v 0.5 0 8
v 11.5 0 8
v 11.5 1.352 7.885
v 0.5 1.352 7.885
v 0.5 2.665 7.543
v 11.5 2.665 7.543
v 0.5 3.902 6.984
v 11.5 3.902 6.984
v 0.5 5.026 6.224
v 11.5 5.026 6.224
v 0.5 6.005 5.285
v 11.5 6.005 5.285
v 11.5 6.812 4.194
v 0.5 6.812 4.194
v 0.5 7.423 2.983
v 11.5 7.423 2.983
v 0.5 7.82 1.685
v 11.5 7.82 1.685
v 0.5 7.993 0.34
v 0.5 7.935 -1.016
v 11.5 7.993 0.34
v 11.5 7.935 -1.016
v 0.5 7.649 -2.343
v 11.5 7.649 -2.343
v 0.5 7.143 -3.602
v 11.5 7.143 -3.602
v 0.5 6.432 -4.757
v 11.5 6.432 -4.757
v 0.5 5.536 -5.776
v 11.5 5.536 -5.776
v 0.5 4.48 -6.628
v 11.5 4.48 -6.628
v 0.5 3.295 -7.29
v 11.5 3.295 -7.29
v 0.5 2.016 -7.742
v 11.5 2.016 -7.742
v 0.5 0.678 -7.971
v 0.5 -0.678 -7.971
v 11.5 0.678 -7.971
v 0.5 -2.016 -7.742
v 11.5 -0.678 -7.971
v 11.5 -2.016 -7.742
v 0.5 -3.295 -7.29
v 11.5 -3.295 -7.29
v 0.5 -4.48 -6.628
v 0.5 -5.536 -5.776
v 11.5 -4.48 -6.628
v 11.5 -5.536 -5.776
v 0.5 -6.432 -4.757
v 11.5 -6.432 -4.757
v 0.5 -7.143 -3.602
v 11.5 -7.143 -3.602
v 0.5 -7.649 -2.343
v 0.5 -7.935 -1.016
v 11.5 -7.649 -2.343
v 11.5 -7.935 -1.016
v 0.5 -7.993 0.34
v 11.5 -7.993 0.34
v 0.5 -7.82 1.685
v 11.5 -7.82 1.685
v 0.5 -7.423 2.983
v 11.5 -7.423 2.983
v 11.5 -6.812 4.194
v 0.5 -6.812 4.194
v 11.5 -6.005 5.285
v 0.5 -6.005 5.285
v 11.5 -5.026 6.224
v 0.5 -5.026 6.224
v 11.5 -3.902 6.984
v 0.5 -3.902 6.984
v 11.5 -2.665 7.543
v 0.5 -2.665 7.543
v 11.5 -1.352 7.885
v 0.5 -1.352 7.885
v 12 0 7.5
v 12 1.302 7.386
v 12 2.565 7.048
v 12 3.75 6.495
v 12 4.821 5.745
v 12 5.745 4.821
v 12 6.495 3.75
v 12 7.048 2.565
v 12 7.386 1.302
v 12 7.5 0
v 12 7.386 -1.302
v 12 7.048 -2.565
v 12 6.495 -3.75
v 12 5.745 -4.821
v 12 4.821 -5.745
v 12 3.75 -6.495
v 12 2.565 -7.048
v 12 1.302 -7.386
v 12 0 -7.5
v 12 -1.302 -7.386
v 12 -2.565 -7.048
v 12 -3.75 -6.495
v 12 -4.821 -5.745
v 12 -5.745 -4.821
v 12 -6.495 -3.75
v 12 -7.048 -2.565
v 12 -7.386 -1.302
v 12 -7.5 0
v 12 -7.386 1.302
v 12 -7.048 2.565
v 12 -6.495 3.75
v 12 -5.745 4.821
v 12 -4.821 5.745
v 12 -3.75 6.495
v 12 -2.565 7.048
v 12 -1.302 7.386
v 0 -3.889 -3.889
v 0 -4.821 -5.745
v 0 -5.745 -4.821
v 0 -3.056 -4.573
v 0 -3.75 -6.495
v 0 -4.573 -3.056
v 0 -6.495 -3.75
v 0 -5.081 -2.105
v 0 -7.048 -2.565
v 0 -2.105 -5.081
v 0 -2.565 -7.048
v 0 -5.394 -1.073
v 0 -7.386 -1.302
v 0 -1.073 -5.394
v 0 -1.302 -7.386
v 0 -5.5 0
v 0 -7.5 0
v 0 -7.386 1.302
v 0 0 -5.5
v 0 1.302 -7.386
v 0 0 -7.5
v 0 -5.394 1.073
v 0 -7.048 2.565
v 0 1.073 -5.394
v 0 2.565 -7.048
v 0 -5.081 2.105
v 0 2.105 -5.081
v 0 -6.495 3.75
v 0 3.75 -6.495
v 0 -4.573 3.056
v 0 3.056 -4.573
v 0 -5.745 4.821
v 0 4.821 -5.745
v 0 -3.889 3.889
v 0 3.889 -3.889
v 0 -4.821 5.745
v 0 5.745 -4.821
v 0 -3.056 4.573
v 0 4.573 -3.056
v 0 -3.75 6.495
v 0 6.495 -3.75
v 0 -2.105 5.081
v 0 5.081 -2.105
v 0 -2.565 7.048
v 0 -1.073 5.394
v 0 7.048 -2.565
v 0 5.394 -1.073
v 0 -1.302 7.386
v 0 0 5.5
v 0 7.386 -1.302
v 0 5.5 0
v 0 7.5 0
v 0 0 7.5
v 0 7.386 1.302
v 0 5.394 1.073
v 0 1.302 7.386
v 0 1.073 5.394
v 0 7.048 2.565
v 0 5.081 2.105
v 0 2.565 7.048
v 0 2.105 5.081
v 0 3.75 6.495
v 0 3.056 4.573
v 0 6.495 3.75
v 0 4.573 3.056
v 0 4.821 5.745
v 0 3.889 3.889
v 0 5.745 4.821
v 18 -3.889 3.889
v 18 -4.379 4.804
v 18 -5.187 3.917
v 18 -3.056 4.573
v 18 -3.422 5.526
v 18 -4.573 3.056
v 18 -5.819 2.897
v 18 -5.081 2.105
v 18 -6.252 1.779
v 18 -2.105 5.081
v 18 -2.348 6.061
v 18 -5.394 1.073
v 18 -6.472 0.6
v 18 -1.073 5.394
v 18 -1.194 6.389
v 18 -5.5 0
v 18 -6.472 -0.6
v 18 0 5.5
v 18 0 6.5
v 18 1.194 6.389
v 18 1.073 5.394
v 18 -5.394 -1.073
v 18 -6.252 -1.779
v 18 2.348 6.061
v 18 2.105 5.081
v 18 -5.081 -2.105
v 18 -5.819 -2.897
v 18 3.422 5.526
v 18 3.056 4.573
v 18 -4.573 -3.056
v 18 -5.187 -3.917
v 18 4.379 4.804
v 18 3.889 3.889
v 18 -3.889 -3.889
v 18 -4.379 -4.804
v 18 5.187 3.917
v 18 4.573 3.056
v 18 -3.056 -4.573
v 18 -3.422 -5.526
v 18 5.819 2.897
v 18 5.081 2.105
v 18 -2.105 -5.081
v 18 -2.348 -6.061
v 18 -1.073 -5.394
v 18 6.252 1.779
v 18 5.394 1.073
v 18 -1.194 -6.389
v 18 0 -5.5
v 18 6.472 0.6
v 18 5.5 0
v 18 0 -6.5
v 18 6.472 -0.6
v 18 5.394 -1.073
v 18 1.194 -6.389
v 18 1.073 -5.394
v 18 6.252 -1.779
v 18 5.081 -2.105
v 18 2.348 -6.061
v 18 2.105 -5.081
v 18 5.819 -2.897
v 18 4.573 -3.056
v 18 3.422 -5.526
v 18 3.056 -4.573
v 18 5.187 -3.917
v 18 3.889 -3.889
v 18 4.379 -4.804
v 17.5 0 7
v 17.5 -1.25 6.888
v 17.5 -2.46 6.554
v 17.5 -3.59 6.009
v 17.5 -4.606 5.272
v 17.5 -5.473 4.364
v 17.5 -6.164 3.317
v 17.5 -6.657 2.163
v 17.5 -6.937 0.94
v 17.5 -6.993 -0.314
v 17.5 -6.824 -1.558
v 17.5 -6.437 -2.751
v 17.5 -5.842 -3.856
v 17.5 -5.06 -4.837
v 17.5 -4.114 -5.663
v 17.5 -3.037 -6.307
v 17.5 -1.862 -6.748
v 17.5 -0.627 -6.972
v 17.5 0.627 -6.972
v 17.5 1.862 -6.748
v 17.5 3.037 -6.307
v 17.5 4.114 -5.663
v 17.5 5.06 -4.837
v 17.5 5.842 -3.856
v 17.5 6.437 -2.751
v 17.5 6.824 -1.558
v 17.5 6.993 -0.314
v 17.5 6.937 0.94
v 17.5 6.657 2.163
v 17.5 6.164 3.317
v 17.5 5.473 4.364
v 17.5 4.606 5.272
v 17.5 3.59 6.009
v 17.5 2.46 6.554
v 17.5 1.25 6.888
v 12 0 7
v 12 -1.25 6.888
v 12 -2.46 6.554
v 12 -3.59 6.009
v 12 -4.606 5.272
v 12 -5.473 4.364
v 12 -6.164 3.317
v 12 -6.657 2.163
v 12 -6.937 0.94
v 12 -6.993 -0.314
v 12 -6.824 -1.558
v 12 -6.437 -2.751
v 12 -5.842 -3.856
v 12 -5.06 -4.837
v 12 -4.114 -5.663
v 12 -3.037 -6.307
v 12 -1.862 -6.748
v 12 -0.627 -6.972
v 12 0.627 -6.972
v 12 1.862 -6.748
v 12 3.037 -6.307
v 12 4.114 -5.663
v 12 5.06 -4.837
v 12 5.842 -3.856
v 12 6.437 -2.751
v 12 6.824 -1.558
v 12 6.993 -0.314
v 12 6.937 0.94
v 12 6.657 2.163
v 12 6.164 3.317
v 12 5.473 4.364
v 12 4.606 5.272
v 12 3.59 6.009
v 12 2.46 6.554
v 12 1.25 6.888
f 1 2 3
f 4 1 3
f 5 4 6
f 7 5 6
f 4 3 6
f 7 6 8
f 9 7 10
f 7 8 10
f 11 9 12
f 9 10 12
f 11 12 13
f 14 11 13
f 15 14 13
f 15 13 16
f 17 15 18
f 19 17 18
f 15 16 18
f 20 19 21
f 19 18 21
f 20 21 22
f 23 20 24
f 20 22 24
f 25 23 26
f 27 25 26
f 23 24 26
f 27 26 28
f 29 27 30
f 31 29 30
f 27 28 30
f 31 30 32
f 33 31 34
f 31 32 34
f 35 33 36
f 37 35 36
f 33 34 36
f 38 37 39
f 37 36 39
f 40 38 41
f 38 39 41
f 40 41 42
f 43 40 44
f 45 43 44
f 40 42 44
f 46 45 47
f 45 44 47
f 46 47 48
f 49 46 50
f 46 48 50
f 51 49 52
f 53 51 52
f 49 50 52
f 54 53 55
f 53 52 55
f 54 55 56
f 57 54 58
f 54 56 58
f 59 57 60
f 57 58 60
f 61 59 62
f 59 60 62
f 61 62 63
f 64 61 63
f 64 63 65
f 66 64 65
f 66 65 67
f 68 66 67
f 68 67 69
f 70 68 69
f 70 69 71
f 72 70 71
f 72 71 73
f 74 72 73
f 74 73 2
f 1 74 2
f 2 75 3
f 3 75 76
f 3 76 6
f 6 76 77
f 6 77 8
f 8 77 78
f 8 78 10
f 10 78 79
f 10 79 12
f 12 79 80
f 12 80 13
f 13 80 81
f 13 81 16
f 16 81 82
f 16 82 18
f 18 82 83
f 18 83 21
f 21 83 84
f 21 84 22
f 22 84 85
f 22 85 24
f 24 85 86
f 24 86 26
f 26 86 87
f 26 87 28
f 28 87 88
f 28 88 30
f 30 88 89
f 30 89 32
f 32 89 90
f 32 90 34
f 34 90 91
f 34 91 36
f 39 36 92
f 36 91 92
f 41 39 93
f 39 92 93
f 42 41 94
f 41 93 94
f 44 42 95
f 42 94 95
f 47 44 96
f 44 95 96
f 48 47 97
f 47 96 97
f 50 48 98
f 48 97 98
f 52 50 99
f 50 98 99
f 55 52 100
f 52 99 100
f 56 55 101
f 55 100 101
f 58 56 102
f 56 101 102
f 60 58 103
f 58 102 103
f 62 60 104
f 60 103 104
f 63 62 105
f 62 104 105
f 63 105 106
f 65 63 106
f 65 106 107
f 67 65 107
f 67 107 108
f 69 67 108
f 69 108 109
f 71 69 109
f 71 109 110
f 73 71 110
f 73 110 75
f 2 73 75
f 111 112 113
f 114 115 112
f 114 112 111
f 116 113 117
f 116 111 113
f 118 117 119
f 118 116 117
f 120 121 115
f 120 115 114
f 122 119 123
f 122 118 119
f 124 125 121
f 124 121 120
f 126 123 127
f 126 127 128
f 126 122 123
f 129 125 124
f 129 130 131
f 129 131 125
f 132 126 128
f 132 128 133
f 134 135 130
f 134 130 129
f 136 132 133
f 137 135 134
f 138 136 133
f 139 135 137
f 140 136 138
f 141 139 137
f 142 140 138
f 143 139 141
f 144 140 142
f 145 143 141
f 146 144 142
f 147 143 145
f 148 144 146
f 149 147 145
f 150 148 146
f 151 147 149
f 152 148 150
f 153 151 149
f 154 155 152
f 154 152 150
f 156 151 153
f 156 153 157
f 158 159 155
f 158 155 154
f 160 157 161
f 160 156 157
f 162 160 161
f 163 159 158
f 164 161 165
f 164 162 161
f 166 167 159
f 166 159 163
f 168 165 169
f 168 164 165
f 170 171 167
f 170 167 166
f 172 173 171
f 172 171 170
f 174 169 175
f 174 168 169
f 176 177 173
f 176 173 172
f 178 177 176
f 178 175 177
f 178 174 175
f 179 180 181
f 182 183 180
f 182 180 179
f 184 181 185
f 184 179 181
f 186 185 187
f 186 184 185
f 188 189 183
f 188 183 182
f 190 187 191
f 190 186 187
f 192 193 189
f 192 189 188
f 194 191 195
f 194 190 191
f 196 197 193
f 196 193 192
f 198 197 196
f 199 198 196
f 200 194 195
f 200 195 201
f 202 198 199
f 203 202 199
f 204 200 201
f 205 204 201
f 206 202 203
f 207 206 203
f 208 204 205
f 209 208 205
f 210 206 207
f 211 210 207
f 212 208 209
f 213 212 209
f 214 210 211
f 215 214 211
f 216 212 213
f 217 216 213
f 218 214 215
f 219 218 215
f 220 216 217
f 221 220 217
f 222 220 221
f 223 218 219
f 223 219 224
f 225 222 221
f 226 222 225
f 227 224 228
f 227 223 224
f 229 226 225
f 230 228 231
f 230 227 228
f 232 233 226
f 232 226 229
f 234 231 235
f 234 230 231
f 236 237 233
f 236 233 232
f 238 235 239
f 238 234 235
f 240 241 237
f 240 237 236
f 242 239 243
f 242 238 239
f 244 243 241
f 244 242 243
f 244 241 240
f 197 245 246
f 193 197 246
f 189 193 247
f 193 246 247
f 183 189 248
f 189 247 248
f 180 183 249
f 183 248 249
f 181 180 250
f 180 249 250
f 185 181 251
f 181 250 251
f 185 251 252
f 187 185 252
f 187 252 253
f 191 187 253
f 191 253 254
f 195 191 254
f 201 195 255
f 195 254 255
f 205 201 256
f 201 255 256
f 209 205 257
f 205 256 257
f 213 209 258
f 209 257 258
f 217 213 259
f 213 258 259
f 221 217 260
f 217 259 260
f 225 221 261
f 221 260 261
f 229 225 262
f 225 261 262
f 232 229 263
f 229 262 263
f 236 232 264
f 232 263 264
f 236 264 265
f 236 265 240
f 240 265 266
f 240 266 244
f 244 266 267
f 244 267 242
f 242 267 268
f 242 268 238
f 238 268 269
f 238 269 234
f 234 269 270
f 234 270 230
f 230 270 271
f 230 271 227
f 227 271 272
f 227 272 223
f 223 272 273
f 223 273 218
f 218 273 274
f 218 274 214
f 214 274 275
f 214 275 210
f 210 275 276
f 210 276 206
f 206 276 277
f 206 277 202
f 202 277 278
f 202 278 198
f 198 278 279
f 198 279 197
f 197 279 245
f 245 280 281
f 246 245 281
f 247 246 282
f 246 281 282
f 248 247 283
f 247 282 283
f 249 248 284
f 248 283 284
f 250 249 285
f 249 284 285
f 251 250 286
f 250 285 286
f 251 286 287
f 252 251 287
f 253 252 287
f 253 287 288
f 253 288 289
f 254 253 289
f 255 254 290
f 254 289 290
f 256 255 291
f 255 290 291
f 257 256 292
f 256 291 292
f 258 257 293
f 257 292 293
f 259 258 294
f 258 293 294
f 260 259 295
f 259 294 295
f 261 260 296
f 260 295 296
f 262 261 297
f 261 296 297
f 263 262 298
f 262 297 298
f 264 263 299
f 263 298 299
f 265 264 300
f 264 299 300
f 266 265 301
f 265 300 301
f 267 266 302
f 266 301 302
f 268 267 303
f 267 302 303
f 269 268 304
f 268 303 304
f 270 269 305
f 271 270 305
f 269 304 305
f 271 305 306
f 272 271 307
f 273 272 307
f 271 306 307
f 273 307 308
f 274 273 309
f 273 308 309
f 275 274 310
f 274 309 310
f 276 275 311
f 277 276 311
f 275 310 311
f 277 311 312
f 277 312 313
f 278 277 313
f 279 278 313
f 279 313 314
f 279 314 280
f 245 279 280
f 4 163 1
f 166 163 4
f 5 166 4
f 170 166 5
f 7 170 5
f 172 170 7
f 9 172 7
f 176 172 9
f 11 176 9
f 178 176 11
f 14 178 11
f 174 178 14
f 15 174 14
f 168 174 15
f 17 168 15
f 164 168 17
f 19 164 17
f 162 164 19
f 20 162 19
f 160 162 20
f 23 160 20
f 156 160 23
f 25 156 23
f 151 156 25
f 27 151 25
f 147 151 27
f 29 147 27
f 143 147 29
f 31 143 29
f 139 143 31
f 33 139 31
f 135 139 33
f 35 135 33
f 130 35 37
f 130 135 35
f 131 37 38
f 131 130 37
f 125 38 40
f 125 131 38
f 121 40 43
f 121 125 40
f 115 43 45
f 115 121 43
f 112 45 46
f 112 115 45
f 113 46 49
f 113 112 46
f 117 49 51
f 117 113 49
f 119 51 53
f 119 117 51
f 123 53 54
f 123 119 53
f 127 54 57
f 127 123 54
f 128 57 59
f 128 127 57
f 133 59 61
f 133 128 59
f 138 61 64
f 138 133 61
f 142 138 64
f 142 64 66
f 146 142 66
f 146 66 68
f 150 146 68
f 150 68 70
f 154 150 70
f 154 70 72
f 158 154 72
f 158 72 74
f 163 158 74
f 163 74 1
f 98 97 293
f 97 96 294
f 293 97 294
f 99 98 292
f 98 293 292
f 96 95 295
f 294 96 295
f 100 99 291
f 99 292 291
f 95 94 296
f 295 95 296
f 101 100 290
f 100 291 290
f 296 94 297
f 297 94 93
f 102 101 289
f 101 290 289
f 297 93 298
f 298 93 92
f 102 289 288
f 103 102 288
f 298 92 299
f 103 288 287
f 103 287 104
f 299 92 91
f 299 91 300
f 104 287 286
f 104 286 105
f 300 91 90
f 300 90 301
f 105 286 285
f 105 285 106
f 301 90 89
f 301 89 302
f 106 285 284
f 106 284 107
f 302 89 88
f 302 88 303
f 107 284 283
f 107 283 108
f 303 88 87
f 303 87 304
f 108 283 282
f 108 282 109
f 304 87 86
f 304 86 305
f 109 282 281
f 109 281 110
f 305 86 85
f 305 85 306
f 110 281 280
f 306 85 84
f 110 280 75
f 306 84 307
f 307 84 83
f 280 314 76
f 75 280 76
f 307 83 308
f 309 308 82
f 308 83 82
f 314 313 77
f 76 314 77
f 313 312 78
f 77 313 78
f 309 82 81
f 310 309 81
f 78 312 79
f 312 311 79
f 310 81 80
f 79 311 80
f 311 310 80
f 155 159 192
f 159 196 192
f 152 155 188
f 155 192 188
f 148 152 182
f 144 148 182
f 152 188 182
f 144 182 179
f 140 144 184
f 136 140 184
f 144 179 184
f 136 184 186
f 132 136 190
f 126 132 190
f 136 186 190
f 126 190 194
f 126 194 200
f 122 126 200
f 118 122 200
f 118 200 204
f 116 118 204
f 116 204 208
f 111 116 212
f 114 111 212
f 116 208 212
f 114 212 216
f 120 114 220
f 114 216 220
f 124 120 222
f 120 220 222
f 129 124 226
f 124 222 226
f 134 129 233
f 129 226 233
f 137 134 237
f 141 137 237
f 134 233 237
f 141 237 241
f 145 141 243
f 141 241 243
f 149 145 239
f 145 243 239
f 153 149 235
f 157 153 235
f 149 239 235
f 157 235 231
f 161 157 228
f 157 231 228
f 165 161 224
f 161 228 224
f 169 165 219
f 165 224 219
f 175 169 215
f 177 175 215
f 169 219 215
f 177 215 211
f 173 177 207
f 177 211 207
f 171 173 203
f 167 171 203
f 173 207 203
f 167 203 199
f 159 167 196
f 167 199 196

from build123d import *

# Parameters (mm, degrees)
CUT_EXTRUDE_START   = -2
SKETCH_4_R          = 9
CUT_EXTRUDE_1_DEPTH = 2
EXTRUDE_START       = -12
SKETCH_5_R          = 8
SKETCH_5_R_2        = 5.5
EXTRUDE_1_DEPTH     = 12
CHAMFER_1_SIZE      = 0.5


with BuildPart() as part:
    # Эскиз1 → Повернуть1 (revolve)
    with BuildSketch(Plane.XY, mode=Mode.PRIVATE) as revolve_1_sk:
        Polygon((0, 5.5), (20, 5.5), (20, 9), (18, 9), (18, 7), (0, 7), align=None)
    revolve(revolve_1_sk.sketch.rotate(Axis((0, 0, 0), (1, 0, 0)), 90), axis=Axis((0, 0, 0), (1, 0, 0)))

    # Эскиз4 → Вырез-Вытянуть1 (cut)
    with BuildSketch(Plane(origin=(20, 0, 0), x_dir=(0, 0, -1), z_dir=(1, 0, 0)).offset(CUT_EXTRUDE_START)):
        Circle(SKETCH_4_R)
    extrude(amount=CUT_EXTRUDE_1_DEPTH, mode=Mode.SUBTRACT)

    # Эскиз5 → Бобышка-Вытянуть1 (add)
    with BuildSketch(Plane.ZY.offset(EXTRUDE_START)):
        Circle(SKETCH_5_R)
        Circle(SKETCH_5_R_2, mode=Mode.SUBTRACT)
    extrude(amount=EXTRUDE_1_DEPTH)

    # Фаска1
    chamfer_1_edges = [part.edges().sort_by_distance(p)[0] for p in [
        (18, 0, -7),
        (12, 0, -8),
        (0, 0, -8),
    ]]
    chamfer(chamfer_1_edges, length=CHAMFER_1_SIZE)


solid = part.part
